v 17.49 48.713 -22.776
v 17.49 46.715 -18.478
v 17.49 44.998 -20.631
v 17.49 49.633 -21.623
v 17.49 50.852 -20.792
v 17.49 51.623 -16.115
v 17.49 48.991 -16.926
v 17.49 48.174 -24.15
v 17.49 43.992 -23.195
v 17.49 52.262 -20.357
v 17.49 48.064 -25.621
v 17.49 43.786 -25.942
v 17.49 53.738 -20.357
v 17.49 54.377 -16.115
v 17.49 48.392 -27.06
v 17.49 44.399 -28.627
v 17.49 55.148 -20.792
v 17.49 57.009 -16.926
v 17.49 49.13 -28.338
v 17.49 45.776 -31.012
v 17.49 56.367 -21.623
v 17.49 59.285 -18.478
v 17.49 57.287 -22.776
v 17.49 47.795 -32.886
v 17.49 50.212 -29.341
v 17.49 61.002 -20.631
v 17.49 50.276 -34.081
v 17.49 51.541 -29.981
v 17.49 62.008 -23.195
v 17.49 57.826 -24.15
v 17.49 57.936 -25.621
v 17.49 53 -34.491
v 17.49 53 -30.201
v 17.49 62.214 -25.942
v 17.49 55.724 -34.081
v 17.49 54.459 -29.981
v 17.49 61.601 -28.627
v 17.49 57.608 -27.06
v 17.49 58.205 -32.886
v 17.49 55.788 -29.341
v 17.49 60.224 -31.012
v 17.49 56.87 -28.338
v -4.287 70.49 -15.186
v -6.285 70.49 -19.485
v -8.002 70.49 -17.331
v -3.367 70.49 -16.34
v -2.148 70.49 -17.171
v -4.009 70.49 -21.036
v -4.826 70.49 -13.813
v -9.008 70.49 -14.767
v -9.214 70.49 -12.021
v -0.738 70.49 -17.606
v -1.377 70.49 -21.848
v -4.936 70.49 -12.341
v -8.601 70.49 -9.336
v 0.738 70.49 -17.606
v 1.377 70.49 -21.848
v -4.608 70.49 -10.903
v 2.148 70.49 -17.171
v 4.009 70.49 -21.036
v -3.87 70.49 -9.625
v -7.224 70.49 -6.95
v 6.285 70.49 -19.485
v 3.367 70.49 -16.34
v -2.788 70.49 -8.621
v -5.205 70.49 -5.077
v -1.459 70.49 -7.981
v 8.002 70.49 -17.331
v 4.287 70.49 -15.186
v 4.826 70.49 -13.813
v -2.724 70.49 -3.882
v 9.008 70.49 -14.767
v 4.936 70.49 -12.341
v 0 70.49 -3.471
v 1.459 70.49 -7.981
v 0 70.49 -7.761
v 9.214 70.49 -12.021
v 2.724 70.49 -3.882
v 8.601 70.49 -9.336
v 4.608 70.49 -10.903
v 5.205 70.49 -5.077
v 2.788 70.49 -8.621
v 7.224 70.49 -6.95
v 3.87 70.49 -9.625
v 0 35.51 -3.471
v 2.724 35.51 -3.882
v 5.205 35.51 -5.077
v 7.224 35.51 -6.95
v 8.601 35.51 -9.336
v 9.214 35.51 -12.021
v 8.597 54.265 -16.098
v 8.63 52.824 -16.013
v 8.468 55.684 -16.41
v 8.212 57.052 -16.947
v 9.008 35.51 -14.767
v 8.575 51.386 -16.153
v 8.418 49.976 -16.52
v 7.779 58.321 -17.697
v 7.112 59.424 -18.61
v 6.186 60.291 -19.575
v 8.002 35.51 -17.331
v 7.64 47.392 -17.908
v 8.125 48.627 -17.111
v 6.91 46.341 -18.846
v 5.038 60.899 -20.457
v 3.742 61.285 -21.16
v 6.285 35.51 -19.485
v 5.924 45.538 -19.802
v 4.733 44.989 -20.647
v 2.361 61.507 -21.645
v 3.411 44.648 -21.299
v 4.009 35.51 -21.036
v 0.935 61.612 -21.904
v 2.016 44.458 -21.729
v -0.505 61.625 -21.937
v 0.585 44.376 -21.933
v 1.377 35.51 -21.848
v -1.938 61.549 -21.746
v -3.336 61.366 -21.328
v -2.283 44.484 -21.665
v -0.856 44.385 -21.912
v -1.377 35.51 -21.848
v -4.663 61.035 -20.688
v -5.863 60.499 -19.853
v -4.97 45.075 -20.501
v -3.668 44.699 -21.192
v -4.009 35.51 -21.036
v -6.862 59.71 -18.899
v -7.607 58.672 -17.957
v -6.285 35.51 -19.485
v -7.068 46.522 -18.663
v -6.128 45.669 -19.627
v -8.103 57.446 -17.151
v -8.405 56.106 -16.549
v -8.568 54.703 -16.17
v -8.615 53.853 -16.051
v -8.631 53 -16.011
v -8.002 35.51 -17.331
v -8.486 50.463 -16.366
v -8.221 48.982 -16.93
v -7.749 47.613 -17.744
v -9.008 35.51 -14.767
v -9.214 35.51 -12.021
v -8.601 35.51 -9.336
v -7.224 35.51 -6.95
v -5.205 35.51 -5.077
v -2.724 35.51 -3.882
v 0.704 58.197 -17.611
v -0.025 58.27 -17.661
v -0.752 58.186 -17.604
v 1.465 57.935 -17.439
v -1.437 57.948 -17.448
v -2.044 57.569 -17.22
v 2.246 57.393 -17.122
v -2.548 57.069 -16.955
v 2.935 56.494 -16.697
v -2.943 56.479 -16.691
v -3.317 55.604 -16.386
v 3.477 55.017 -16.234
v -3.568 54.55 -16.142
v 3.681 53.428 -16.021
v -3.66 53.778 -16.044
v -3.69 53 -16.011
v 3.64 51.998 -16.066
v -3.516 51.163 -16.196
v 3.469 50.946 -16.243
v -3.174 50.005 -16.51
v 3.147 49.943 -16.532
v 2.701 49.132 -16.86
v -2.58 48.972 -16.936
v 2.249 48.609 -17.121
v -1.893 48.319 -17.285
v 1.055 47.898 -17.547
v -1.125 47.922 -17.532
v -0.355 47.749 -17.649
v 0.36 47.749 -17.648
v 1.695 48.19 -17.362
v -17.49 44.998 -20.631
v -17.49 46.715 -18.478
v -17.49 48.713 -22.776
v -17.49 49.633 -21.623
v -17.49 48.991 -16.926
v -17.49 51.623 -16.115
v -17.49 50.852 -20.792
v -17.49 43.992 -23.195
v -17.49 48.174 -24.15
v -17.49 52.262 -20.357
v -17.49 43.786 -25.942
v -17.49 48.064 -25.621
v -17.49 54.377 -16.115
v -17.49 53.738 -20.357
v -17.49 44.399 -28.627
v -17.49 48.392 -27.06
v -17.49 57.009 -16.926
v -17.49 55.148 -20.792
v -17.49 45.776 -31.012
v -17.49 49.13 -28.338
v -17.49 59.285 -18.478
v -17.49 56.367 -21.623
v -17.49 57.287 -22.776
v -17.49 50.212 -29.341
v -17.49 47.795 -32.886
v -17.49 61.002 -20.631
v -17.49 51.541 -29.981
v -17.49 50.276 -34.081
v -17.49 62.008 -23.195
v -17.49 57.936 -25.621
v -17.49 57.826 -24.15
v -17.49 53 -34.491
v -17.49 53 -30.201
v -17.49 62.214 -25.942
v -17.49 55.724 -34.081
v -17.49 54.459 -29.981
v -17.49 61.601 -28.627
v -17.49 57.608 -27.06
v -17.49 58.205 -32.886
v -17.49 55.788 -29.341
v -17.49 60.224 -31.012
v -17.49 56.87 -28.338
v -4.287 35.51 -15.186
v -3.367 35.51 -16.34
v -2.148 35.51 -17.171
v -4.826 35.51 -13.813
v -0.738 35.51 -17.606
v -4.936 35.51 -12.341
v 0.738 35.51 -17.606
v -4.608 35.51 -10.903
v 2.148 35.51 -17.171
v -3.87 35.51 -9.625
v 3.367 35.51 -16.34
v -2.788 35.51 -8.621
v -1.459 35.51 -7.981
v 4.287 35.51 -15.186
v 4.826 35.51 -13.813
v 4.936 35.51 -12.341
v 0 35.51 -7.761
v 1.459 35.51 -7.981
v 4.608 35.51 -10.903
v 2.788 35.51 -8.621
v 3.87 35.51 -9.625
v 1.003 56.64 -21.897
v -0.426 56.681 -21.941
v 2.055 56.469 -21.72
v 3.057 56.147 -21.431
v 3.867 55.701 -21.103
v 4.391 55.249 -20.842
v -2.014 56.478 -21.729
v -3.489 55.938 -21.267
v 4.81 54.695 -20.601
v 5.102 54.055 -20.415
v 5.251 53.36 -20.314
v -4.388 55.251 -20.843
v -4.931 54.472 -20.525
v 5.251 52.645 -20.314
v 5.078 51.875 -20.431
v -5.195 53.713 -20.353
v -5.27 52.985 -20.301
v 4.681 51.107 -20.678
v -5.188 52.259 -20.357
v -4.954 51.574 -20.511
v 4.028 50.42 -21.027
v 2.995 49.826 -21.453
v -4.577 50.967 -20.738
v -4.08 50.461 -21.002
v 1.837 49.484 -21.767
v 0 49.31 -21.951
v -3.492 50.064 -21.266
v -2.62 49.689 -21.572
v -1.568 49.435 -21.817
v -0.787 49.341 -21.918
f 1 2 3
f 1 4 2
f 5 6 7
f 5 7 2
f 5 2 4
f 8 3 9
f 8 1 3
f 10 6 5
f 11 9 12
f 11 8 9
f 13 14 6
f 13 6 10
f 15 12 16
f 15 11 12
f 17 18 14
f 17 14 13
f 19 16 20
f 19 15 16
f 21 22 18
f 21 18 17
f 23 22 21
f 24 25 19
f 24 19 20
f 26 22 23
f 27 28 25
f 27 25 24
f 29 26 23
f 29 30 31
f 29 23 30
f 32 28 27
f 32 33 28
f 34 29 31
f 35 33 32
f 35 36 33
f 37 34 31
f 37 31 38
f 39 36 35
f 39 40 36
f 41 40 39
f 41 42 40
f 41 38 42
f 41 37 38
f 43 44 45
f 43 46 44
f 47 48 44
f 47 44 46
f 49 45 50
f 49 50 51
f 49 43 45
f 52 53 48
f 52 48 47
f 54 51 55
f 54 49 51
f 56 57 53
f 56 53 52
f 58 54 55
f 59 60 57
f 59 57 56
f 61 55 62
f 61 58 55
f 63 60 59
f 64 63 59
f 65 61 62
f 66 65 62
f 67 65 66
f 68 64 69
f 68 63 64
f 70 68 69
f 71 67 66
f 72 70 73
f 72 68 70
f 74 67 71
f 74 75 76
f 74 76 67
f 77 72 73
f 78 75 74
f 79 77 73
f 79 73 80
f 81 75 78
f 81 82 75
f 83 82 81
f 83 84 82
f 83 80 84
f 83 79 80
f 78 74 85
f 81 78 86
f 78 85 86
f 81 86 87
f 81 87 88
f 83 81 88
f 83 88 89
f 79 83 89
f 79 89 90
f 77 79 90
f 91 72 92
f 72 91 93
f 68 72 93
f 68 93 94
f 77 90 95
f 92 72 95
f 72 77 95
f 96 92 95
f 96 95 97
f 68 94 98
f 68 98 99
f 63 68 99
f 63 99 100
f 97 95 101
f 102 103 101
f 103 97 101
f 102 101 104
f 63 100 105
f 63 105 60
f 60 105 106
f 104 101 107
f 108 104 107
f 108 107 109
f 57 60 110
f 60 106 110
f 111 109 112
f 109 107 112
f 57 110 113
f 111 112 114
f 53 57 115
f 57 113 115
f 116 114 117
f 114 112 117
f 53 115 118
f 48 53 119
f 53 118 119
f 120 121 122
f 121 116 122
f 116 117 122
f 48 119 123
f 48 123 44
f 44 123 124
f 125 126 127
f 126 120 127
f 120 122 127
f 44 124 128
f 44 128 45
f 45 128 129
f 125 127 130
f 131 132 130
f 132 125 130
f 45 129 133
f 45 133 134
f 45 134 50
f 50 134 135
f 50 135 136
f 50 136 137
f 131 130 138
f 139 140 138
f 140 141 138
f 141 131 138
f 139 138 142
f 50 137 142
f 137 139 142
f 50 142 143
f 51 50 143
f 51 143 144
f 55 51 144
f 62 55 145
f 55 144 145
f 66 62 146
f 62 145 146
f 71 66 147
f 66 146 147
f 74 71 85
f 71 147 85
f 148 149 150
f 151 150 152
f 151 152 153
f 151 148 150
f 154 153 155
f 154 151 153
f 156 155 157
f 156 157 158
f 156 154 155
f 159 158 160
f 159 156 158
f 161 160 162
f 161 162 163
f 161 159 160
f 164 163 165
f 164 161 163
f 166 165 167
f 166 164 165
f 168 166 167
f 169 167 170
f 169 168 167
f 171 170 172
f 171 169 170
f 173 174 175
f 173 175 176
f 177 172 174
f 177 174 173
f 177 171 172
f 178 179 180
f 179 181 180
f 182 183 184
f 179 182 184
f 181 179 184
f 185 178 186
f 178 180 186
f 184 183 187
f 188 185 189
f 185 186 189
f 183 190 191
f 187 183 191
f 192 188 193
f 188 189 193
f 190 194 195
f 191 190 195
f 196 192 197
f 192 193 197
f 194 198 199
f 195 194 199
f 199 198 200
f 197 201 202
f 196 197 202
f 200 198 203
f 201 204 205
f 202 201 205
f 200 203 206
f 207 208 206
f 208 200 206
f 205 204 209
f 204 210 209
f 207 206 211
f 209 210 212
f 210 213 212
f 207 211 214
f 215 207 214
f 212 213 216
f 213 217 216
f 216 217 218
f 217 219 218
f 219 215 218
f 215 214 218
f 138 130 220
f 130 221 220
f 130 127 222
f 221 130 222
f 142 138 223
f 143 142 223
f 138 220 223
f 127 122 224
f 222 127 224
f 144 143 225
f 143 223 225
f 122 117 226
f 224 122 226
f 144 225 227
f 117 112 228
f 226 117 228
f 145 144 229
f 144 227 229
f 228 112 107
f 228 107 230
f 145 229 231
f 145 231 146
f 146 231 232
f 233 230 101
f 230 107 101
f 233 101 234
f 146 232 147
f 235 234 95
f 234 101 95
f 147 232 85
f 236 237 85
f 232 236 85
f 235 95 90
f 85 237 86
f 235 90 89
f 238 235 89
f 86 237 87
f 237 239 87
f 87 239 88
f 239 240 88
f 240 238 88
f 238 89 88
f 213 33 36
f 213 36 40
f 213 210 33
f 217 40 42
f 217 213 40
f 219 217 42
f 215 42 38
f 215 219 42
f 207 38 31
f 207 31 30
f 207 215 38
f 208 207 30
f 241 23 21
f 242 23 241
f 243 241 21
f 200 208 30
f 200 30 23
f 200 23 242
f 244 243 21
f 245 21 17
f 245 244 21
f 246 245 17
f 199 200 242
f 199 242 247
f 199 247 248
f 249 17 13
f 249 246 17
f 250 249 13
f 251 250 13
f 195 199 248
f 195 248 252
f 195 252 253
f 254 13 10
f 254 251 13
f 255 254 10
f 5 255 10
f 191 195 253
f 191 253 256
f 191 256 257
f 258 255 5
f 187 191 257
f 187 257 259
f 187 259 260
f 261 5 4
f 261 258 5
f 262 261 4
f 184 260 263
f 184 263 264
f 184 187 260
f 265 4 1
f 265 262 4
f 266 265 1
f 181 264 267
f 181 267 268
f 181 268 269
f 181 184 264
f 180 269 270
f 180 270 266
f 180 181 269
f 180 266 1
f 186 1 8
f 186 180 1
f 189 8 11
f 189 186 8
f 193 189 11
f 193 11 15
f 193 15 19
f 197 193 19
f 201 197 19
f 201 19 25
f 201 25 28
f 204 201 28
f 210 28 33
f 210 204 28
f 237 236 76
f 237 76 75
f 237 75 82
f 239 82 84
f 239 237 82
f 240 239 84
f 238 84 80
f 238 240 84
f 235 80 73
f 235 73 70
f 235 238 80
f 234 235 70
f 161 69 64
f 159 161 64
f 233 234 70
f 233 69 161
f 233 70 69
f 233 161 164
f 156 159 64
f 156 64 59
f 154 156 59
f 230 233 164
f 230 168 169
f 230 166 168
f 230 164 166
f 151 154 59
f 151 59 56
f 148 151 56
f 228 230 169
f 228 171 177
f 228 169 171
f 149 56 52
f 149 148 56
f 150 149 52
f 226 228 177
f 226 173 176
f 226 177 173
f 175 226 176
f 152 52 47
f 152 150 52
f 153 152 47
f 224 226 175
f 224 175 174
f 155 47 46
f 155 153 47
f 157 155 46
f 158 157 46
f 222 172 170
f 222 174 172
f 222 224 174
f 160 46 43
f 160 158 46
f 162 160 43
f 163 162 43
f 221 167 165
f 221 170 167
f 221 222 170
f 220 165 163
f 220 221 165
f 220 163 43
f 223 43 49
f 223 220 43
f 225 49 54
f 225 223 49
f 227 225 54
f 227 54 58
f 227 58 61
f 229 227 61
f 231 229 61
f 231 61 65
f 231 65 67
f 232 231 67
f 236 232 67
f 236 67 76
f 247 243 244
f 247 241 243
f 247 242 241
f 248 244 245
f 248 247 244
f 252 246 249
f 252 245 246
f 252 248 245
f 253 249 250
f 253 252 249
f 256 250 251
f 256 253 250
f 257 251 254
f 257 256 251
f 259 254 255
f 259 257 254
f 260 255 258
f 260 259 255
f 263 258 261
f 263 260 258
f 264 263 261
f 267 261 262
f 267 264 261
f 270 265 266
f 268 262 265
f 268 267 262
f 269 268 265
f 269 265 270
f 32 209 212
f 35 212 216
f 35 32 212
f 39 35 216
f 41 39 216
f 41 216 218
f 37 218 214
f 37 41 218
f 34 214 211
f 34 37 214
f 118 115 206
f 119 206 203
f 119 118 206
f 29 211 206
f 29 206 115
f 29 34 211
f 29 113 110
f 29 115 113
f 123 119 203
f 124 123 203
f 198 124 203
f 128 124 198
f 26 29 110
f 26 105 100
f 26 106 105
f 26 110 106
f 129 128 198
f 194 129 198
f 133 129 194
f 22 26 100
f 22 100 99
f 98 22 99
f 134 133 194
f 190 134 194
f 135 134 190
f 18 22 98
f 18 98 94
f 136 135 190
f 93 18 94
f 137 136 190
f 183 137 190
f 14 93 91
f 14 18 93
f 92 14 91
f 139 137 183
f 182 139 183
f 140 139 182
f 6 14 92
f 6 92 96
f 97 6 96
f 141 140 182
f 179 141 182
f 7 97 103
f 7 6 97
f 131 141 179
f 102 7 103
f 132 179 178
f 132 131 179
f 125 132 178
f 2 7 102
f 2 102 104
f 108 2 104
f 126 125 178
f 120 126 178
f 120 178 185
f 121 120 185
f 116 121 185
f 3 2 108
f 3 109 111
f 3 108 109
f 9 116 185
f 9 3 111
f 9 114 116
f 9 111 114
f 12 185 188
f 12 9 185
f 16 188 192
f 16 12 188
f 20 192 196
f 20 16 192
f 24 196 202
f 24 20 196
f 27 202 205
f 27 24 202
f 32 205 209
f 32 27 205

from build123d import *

# Parameters (mm, degrees)
SKETCH1_R           = 28
SKETCH1_R_2         = 15
BOSS_EXTRUDE1_DEPTH = 106
SKETCH4_R           = 28
SKETCH4_R_2         = 15
BOSS_EXTRUDE2_DEPTH = 53
CUT_EXTRUDE2_START  = -106
SKETCH5_R           = 15
CUT_EXTRUDE2_DEPTH  = 106
SCALE1_SCALE        = 0.33


with BuildPart() as part:
    # Sketch1 → Boss-Extrude1 (new body)
    with BuildSketch(Plane(origin=(0, 0, 0), x_dir=(1, 0, 0), z_dir=(0, 1, 0))):
        with Locations(Location((0, 0, 0), (0, 0, 270))):
            Circle(SKETCH1_R)
        with Locations(Location((0, 0, 0), (0, 0, 270))):
            Circle(SKETCH1_R_2, mode=Mode.SUBTRACT)
    extrude(amount=BOSS_EXTRUDE1_DEPTH)

    # Sketch4 → Boss-Extrude2 (add, symmetric)
    with BuildSketch(Plane(origin=(0, 0, 0), x_dir=(0, 0, -1), z_dir=(1, 0, 0))):
        with Locations((38, 53)):
            Circle(SKETCH4_R)
        with Locations((38, 53)):
            Circle(SKETCH4_R_2, mode=Mode.SUBTRACT)
    extrude(amount=BOSS_EXTRUDE2_DEPTH, both=True)

    # Sketch5 → Cut-Extrude2 (cut)
    with BuildSketch(Plane(origin=(53, 0, 0), x_dir=(0, 0, -1), z_dir=(1, 0, 0)).offset(CUT_EXTRUDE2_START)):
        with Locations((38, 53)):
            Circle(SKETCH5_R)
    extrude(amount=CUT_EXTRUDE2_DEPTH, mode=Mode.SUBTRACT)


with BuildPart() as part_1:
    # Scale1: scaled about (-6.4e-07, 52.999995481, -18.972102588)
    add(part.part.scale(SCALE1_SCALE).moved(Location((-4.29e-07, 35.509996972, -12.711308734))))


solid = part_1.part
